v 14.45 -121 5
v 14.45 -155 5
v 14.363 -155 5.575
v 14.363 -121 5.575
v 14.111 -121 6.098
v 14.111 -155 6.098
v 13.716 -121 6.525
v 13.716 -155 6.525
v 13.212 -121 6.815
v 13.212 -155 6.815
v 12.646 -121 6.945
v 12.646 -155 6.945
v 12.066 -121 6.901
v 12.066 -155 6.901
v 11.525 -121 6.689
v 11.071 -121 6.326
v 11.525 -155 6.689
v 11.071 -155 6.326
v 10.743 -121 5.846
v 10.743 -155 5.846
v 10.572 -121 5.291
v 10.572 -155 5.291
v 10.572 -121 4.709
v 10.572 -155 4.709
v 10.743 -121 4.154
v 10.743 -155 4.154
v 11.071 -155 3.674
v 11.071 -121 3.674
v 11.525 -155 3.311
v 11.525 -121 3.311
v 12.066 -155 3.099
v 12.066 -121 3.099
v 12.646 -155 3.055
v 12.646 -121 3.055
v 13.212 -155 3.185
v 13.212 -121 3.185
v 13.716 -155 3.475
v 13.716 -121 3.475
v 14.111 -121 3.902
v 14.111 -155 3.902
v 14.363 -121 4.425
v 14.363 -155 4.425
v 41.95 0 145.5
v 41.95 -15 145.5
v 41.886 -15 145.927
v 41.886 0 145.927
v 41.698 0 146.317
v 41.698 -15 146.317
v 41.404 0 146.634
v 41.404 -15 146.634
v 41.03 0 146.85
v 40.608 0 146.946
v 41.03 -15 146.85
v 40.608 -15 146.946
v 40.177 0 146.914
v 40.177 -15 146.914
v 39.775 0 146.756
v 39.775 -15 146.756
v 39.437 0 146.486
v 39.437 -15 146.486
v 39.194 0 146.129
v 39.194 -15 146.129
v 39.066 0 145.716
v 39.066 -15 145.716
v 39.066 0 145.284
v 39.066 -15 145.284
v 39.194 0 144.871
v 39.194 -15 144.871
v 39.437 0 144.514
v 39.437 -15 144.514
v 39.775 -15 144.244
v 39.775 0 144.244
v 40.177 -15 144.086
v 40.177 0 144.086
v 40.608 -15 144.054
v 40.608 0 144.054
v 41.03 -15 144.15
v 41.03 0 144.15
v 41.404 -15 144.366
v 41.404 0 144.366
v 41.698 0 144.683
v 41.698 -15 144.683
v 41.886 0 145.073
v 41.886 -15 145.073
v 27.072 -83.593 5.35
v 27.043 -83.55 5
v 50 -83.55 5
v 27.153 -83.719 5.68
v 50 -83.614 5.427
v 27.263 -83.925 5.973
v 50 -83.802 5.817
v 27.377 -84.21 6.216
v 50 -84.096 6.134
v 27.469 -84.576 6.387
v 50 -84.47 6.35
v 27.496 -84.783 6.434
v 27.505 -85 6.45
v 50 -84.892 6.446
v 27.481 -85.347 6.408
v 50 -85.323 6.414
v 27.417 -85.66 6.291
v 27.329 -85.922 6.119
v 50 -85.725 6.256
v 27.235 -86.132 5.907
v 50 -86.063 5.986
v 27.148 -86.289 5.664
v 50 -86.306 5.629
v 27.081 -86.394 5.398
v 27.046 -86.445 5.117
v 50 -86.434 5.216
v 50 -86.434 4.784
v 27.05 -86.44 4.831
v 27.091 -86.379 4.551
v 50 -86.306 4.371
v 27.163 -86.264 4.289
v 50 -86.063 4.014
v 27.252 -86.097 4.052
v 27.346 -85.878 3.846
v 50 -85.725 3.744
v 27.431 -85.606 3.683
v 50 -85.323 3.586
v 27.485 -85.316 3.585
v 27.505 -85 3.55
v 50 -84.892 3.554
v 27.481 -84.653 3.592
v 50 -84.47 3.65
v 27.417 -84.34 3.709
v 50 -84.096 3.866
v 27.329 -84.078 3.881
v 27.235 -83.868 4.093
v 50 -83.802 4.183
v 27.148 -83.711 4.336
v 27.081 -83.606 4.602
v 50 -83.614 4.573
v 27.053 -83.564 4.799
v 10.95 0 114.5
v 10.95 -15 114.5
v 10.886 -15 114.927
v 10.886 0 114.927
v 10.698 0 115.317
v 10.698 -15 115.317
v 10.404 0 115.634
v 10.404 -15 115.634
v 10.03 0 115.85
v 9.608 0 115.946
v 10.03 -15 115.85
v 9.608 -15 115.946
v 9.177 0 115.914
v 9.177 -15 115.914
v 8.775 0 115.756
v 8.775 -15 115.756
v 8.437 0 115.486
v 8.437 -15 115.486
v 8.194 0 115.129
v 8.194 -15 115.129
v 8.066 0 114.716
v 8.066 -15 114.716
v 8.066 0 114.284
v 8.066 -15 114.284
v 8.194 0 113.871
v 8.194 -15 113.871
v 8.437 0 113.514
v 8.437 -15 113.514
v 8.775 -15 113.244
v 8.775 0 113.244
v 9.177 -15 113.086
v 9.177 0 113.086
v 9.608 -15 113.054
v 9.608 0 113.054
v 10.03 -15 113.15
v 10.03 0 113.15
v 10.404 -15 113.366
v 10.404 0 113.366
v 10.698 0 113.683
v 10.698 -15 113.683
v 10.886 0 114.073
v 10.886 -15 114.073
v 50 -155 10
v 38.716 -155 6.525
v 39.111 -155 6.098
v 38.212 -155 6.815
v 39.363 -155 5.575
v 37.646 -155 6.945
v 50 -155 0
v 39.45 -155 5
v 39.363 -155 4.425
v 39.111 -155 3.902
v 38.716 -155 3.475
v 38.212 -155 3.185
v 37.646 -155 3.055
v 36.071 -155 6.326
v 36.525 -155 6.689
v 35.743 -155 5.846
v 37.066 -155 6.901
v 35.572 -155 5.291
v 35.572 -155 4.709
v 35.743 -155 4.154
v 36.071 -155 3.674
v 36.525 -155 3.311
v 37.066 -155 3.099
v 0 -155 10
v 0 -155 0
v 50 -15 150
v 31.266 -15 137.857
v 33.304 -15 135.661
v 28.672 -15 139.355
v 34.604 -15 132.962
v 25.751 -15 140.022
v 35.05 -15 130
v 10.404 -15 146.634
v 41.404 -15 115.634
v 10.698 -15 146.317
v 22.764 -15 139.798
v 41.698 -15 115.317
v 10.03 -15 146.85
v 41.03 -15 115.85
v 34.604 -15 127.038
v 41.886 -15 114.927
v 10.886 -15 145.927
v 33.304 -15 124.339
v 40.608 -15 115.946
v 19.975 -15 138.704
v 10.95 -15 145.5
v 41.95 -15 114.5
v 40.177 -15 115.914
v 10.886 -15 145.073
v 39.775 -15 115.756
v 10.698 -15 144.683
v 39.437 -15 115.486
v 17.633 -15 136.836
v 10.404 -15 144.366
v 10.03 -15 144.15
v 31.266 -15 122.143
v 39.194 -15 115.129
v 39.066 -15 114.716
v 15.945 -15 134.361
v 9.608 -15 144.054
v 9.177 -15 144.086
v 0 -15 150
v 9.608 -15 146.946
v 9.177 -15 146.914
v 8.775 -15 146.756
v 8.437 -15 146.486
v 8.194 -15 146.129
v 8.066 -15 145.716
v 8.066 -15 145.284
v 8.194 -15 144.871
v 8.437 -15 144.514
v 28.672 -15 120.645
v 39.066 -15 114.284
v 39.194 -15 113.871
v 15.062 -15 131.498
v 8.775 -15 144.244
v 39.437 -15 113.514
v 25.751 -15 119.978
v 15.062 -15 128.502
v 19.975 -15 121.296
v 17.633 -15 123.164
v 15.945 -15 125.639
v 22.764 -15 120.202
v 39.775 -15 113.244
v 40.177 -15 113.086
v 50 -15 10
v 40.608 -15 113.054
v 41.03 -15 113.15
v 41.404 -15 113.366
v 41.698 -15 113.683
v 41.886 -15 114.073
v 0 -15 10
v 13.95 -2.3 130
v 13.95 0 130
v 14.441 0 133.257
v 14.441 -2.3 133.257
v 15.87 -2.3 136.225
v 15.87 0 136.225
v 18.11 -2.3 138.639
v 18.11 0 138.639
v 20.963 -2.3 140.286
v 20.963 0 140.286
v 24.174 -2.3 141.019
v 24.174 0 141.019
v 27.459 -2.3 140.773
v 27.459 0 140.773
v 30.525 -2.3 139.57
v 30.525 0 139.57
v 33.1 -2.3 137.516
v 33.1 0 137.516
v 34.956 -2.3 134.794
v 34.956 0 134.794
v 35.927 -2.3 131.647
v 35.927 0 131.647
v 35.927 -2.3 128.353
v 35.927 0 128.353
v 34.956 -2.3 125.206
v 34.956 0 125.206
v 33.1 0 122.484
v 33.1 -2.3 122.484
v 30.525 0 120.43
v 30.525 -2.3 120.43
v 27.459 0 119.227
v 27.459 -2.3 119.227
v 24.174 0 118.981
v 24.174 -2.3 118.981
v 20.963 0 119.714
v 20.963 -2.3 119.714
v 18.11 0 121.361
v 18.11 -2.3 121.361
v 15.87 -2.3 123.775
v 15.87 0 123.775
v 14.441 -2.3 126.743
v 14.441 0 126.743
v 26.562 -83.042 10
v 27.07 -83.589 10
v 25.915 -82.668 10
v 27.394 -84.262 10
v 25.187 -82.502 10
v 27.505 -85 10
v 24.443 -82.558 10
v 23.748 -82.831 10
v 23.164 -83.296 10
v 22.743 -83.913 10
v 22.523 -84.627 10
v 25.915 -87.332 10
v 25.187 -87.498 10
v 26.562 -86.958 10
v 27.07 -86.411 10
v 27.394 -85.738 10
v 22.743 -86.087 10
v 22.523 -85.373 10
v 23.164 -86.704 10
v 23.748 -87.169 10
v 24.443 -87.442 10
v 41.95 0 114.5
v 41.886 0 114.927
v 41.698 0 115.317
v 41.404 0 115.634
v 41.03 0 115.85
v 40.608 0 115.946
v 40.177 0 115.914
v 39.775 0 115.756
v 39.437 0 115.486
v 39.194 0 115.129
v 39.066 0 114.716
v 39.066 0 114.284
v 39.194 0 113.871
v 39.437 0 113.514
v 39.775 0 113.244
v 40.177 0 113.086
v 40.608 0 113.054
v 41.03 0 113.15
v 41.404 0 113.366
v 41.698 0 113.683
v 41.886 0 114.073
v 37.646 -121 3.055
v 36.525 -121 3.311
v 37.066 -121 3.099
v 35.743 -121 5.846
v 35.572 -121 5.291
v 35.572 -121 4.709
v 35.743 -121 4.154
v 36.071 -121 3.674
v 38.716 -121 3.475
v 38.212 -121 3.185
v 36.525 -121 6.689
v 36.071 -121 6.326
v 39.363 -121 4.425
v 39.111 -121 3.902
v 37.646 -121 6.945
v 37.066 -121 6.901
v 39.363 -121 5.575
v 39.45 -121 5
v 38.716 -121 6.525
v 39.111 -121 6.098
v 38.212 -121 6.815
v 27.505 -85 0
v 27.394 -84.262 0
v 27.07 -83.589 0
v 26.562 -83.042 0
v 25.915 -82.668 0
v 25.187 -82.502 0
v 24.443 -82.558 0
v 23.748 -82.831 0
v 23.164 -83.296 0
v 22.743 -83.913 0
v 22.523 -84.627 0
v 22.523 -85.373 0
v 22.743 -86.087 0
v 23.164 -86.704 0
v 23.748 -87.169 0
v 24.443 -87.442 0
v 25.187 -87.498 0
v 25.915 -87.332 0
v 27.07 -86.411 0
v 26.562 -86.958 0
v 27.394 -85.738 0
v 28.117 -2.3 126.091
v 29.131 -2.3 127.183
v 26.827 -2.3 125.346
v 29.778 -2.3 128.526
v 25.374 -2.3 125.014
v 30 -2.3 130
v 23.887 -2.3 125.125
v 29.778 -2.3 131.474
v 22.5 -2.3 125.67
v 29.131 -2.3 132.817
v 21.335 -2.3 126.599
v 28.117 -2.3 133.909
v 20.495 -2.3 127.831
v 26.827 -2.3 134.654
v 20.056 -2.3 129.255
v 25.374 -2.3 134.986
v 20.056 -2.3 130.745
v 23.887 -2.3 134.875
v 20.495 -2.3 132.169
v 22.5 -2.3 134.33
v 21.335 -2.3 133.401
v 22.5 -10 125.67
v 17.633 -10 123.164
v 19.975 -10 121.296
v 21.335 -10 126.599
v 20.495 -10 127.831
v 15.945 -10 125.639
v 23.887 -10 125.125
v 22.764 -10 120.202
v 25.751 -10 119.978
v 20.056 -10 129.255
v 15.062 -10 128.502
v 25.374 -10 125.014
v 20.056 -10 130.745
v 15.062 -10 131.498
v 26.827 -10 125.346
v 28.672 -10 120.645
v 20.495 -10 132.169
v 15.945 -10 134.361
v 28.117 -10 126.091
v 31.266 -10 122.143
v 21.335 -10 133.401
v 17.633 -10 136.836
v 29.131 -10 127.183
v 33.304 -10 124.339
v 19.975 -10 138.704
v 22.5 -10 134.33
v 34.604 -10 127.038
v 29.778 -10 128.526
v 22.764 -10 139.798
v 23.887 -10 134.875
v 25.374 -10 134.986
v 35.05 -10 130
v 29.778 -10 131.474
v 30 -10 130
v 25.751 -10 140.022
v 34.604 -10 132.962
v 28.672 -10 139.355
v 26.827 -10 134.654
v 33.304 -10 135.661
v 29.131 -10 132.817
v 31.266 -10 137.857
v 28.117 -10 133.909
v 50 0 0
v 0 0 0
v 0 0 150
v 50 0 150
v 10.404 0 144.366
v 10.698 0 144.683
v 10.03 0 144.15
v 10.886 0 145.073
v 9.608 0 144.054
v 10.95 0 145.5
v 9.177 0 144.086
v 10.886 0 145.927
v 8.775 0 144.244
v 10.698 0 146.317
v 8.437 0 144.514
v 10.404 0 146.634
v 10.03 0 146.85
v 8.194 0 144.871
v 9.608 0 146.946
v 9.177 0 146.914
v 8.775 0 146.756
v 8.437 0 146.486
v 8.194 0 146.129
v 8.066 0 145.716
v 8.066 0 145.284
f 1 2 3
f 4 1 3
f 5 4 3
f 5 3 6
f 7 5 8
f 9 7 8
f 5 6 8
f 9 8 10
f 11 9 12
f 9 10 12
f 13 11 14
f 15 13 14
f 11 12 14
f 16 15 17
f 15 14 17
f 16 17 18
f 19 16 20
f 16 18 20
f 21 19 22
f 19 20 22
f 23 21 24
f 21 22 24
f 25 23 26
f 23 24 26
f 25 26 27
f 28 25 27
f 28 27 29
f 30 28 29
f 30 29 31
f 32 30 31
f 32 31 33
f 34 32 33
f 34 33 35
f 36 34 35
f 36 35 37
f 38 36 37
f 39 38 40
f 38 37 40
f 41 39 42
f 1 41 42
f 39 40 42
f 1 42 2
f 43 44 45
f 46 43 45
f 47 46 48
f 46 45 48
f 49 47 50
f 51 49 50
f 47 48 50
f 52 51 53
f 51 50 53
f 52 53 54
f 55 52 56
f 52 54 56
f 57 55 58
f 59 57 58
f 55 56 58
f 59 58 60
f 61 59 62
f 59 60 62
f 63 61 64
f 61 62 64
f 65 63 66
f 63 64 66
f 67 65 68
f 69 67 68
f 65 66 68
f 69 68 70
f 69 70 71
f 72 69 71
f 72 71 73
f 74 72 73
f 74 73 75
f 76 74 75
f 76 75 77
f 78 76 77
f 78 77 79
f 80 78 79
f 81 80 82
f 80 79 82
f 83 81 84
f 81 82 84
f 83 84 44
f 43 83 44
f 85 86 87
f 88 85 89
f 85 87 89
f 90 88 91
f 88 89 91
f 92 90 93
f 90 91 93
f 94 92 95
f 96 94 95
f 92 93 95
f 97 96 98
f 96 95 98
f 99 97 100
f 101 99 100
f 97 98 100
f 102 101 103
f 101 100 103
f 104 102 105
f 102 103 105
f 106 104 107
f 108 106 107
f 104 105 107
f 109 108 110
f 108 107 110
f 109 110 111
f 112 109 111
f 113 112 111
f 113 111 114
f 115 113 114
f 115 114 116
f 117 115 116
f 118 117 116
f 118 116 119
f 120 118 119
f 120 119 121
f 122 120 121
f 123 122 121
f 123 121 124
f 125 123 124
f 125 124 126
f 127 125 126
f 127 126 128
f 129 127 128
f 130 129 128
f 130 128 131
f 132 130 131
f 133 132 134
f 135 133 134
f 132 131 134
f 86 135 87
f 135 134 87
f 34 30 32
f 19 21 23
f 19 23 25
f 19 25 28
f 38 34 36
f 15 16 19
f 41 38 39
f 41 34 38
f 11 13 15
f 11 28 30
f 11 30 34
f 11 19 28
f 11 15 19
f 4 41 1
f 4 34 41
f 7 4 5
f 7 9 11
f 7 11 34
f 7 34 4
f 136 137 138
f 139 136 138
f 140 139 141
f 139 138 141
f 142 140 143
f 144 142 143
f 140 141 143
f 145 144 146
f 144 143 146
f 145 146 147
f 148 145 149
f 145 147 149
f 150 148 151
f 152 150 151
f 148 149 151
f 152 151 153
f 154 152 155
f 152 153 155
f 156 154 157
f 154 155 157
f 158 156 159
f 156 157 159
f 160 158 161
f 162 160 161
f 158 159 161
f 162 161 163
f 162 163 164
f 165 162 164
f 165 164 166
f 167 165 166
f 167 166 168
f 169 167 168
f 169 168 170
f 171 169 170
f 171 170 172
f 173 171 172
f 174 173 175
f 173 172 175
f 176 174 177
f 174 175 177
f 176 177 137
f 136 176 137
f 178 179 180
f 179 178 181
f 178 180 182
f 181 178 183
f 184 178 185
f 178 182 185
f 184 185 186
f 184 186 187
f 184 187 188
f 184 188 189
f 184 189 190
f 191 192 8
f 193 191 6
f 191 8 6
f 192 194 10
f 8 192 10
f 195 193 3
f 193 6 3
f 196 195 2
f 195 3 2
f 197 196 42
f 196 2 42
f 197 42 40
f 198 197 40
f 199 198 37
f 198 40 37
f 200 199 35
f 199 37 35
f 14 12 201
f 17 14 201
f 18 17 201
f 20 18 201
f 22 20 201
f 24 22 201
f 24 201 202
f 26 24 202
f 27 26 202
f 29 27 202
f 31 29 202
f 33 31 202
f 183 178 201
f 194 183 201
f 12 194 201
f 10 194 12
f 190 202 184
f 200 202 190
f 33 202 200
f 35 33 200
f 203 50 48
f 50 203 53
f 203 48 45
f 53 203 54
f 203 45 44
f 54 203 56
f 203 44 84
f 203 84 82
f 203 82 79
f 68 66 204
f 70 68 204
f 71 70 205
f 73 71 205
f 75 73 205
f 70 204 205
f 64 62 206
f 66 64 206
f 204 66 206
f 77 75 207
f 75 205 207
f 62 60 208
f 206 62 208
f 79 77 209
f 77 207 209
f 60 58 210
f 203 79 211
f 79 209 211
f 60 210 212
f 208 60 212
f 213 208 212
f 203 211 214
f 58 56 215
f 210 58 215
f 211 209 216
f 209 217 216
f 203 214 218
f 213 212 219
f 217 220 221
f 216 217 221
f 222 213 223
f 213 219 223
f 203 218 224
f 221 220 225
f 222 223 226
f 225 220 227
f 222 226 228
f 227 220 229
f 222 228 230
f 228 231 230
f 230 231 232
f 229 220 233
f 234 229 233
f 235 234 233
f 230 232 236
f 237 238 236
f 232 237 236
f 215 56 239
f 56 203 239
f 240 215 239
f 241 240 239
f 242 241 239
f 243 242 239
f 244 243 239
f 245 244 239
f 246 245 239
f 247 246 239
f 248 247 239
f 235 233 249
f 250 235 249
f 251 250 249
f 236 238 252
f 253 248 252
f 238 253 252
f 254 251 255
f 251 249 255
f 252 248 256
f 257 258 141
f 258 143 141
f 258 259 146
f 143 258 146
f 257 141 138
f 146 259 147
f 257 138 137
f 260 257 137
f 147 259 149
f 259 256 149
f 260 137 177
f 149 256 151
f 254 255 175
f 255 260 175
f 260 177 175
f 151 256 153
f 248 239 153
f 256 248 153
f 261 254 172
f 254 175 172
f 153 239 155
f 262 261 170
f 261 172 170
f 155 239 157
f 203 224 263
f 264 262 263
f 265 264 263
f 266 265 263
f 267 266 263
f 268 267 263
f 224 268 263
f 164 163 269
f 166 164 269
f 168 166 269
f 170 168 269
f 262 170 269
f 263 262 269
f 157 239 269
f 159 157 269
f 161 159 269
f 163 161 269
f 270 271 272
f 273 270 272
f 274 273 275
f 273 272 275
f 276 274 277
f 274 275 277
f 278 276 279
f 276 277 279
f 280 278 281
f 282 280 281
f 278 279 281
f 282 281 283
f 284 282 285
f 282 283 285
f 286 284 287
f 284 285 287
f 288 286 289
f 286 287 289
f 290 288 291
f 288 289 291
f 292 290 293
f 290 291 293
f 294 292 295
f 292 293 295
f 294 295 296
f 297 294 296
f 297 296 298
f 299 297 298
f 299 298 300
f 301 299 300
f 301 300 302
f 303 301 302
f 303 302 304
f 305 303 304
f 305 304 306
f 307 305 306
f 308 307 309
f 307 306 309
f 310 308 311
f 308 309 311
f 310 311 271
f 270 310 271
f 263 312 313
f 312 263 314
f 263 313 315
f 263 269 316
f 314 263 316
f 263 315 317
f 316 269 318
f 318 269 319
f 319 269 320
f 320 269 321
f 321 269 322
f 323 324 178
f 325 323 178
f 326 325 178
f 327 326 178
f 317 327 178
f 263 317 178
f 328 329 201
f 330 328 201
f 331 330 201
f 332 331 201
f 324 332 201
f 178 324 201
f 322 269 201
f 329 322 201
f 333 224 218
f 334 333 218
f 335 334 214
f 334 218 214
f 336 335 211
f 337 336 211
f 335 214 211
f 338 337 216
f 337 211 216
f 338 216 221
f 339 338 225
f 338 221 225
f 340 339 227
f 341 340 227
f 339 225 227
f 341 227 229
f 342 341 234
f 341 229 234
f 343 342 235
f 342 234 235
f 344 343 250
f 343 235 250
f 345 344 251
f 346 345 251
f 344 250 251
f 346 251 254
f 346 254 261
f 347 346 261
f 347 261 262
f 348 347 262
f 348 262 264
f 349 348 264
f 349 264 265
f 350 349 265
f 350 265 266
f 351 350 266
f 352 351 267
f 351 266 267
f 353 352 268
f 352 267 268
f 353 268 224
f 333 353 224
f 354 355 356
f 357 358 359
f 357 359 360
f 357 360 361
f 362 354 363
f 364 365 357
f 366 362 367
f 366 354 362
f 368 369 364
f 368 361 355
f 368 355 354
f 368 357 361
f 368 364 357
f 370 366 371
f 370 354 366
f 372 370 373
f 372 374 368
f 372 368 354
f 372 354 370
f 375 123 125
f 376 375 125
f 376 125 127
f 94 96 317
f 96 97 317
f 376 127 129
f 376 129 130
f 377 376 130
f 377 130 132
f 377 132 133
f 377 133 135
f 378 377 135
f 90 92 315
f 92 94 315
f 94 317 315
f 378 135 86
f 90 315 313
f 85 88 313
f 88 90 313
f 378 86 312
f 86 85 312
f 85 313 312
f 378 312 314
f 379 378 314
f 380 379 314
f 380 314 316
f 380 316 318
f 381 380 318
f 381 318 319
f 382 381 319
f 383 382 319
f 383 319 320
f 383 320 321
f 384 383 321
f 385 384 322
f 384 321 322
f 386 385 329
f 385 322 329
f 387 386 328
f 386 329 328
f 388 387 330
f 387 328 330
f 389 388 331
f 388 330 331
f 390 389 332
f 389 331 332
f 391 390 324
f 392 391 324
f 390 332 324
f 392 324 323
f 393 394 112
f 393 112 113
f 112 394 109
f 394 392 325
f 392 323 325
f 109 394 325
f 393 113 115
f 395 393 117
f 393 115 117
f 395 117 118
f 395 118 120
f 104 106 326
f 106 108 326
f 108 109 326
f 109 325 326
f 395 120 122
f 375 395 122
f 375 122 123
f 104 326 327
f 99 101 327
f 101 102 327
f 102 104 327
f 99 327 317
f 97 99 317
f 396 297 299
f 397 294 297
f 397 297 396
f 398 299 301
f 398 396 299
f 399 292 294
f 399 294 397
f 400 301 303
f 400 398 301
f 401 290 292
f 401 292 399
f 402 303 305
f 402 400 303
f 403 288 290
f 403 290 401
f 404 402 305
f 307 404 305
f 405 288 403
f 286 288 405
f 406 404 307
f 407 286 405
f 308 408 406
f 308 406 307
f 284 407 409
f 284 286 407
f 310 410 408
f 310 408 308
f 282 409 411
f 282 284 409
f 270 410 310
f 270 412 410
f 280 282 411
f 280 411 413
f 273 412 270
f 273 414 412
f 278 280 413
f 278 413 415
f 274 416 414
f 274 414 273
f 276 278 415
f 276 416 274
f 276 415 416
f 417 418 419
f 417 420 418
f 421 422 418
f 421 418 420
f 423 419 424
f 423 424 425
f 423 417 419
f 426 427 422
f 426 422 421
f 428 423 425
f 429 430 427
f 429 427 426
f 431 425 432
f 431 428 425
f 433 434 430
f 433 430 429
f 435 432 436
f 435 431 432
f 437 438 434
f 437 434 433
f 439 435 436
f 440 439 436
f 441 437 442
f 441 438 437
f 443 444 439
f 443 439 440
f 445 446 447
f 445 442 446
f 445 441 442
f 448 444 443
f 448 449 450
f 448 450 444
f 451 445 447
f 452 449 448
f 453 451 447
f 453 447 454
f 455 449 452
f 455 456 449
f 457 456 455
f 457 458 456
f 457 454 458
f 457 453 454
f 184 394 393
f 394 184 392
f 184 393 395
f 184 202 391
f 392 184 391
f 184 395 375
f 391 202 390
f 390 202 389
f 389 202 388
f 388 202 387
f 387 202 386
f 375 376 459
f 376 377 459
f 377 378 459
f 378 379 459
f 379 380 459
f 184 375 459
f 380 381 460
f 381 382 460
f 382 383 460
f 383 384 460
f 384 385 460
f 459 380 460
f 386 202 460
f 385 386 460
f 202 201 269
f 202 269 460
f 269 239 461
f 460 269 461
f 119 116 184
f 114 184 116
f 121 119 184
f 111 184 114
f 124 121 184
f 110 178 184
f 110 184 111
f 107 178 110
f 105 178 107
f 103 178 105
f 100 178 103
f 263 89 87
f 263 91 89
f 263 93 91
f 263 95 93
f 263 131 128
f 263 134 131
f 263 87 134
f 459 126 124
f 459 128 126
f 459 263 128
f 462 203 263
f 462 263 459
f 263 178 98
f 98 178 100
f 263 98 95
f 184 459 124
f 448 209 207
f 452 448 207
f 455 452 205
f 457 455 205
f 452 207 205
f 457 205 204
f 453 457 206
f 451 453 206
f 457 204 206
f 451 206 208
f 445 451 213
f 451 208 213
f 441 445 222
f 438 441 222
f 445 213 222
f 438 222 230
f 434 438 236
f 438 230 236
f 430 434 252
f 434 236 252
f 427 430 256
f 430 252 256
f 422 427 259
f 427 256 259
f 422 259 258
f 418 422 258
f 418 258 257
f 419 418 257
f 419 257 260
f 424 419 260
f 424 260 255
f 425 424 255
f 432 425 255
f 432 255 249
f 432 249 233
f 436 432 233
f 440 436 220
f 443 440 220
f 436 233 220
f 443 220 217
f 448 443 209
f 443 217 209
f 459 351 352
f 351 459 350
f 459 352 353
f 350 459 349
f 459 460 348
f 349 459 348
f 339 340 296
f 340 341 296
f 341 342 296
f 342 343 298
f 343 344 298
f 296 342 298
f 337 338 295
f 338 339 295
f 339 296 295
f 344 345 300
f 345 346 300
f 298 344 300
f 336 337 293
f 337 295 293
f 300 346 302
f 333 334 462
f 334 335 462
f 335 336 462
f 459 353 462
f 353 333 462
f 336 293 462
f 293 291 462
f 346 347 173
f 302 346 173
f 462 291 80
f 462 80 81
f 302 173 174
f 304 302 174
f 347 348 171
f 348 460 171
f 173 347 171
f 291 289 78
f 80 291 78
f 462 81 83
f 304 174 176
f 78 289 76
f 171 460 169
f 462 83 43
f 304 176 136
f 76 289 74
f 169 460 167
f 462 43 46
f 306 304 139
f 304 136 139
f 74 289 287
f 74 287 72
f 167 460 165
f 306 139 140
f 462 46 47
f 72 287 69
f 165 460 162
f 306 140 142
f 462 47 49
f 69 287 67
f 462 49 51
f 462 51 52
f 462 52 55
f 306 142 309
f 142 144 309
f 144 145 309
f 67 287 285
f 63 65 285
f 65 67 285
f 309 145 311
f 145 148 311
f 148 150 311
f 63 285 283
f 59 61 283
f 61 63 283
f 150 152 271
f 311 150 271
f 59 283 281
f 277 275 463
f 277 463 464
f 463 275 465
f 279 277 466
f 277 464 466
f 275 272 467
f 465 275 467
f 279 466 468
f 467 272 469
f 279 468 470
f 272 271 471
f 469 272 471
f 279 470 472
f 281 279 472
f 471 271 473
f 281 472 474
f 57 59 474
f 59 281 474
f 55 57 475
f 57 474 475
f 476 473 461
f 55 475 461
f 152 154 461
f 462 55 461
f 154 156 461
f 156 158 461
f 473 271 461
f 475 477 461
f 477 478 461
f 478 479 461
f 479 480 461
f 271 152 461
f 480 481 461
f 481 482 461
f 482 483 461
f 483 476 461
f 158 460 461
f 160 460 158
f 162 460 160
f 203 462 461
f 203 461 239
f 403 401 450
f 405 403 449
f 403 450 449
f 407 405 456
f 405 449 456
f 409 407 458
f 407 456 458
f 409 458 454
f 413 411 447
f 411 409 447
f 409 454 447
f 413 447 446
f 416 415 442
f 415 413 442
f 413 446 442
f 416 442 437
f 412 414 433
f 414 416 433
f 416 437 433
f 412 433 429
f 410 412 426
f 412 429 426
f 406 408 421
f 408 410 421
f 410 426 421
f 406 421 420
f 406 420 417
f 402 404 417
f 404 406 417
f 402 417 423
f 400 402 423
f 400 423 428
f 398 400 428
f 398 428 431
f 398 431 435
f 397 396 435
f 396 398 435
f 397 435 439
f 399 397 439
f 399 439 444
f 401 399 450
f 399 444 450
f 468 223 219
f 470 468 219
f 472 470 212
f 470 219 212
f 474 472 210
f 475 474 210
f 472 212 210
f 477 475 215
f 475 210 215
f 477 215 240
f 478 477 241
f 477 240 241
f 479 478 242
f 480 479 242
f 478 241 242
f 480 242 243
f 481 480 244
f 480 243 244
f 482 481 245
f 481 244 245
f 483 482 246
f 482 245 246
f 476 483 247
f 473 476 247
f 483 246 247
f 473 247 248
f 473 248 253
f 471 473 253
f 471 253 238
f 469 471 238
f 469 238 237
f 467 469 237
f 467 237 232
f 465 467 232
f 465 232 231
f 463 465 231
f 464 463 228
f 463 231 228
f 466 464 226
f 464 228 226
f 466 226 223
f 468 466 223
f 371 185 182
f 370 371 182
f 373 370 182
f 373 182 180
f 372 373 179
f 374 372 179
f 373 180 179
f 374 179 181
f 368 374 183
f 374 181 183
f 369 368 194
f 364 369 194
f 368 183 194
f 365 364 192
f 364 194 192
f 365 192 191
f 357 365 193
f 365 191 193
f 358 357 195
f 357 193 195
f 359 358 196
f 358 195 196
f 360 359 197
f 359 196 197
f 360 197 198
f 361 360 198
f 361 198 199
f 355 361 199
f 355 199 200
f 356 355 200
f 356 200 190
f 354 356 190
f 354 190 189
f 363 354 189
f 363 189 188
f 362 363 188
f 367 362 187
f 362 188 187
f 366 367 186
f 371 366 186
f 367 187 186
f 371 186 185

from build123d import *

# Parameters (mm, degrees)
F1_DEPTH  = 50
F2_R      = 5
F2_R_2    = 1.45
F3_DEPTH  = 15
F2_R_3    = 10.05
F4_DEPTH  = 5
F5_R      = 11.05
F5_R_2    = 5
F6_DEPTH  = 2.3
F7_R      = 1.95
F8_DEPTH  = 34
F9_R      = 2.505
F10_DEPTH = 10
F11_R     = 1.45
F12_DEPTH = 22.958324159


with BuildPart() as f1:
    # F0 (on Right) → F1 (new body)
    with BuildSketch(Plane.YZ):
        Polygon((-15, 150), (-15, 10), (-155, 10), (-155, 0), (0, 0), (0, 150), align=None)
    extrude(amount=F1_DEPTH)

    # F2 (on face) → F3 (cut, through all)
    with BuildSketch(Plane.XZ.offset(15)):
        with Locations((25, 130)):
            Circle(F2_R)
        with Locations((9.5, 145.5)):
            Circle(F2_R_2)
        with Locations((9.5, 114.5)):
            Circle(F2_R_2)
        with Locations((40.5, 114.5)):
            Circle(F2_R_2)
        with Locations((40.5, 145.5)):
            Circle(F2_R_2)
    extrude(amount=-F3_DEPTH, mode=Mode.SUBTRACT)

    # F2 (on face) → F4 (cut)
    with BuildSketch(Plane.XZ.offset(15)):
        with Locations((25, 130)):
            Circle(F2_R_3)
        with Locations((25, 130)):
            Circle(F2_R, mode=Mode.SUBTRACT)
    extrude(amount=-F4_DEPTH, mode=Mode.SUBTRACT)

    # F5 (on face) → F6 (cut)
    with BuildSketch(Plane(origin=(0, 0, 0), x_dir=(-1, 0, 0), z_dir=(0, 1, 0))):
        with Locations((-25, 130)):
            Circle(F5_R)
        with Locations((-25, 130)):
            Circle(F5_R_2, mode=Mode.SUBTRACT)
    extrude(amount=-F6_DEPTH, mode=Mode.SUBTRACT)

    # F7 (on face) → F8 (cut)
    with BuildSketch(Plane.XZ.offset(155)):
        with Locations((12.5, 5)):
            Circle(F7_R)
        with Locations((37.5, 5)):
            Circle(F7_R)
    extrude(amount=-F8_DEPTH, mode=Mode.SUBTRACT)

    # F9 (on face) → F10 (cut, through all)
    with BuildSketch(Plane.XY.offset(10)):
        with Locations((25, -85)):
            Circle(F9_R)
    extrude(amount=-F10_DEPTH, mode=Mode.SUBTRACT)

    # F11 (on face) → F12 (cut, through all)
    with BuildSketch(Plane.YZ.offset(50)):
        with Locations((-85, 5)):
            Circle(F11_R)
    extrude(amount=-F12_DEPTH, mode=Mode.SUBTRACT)


solid = f1.part
